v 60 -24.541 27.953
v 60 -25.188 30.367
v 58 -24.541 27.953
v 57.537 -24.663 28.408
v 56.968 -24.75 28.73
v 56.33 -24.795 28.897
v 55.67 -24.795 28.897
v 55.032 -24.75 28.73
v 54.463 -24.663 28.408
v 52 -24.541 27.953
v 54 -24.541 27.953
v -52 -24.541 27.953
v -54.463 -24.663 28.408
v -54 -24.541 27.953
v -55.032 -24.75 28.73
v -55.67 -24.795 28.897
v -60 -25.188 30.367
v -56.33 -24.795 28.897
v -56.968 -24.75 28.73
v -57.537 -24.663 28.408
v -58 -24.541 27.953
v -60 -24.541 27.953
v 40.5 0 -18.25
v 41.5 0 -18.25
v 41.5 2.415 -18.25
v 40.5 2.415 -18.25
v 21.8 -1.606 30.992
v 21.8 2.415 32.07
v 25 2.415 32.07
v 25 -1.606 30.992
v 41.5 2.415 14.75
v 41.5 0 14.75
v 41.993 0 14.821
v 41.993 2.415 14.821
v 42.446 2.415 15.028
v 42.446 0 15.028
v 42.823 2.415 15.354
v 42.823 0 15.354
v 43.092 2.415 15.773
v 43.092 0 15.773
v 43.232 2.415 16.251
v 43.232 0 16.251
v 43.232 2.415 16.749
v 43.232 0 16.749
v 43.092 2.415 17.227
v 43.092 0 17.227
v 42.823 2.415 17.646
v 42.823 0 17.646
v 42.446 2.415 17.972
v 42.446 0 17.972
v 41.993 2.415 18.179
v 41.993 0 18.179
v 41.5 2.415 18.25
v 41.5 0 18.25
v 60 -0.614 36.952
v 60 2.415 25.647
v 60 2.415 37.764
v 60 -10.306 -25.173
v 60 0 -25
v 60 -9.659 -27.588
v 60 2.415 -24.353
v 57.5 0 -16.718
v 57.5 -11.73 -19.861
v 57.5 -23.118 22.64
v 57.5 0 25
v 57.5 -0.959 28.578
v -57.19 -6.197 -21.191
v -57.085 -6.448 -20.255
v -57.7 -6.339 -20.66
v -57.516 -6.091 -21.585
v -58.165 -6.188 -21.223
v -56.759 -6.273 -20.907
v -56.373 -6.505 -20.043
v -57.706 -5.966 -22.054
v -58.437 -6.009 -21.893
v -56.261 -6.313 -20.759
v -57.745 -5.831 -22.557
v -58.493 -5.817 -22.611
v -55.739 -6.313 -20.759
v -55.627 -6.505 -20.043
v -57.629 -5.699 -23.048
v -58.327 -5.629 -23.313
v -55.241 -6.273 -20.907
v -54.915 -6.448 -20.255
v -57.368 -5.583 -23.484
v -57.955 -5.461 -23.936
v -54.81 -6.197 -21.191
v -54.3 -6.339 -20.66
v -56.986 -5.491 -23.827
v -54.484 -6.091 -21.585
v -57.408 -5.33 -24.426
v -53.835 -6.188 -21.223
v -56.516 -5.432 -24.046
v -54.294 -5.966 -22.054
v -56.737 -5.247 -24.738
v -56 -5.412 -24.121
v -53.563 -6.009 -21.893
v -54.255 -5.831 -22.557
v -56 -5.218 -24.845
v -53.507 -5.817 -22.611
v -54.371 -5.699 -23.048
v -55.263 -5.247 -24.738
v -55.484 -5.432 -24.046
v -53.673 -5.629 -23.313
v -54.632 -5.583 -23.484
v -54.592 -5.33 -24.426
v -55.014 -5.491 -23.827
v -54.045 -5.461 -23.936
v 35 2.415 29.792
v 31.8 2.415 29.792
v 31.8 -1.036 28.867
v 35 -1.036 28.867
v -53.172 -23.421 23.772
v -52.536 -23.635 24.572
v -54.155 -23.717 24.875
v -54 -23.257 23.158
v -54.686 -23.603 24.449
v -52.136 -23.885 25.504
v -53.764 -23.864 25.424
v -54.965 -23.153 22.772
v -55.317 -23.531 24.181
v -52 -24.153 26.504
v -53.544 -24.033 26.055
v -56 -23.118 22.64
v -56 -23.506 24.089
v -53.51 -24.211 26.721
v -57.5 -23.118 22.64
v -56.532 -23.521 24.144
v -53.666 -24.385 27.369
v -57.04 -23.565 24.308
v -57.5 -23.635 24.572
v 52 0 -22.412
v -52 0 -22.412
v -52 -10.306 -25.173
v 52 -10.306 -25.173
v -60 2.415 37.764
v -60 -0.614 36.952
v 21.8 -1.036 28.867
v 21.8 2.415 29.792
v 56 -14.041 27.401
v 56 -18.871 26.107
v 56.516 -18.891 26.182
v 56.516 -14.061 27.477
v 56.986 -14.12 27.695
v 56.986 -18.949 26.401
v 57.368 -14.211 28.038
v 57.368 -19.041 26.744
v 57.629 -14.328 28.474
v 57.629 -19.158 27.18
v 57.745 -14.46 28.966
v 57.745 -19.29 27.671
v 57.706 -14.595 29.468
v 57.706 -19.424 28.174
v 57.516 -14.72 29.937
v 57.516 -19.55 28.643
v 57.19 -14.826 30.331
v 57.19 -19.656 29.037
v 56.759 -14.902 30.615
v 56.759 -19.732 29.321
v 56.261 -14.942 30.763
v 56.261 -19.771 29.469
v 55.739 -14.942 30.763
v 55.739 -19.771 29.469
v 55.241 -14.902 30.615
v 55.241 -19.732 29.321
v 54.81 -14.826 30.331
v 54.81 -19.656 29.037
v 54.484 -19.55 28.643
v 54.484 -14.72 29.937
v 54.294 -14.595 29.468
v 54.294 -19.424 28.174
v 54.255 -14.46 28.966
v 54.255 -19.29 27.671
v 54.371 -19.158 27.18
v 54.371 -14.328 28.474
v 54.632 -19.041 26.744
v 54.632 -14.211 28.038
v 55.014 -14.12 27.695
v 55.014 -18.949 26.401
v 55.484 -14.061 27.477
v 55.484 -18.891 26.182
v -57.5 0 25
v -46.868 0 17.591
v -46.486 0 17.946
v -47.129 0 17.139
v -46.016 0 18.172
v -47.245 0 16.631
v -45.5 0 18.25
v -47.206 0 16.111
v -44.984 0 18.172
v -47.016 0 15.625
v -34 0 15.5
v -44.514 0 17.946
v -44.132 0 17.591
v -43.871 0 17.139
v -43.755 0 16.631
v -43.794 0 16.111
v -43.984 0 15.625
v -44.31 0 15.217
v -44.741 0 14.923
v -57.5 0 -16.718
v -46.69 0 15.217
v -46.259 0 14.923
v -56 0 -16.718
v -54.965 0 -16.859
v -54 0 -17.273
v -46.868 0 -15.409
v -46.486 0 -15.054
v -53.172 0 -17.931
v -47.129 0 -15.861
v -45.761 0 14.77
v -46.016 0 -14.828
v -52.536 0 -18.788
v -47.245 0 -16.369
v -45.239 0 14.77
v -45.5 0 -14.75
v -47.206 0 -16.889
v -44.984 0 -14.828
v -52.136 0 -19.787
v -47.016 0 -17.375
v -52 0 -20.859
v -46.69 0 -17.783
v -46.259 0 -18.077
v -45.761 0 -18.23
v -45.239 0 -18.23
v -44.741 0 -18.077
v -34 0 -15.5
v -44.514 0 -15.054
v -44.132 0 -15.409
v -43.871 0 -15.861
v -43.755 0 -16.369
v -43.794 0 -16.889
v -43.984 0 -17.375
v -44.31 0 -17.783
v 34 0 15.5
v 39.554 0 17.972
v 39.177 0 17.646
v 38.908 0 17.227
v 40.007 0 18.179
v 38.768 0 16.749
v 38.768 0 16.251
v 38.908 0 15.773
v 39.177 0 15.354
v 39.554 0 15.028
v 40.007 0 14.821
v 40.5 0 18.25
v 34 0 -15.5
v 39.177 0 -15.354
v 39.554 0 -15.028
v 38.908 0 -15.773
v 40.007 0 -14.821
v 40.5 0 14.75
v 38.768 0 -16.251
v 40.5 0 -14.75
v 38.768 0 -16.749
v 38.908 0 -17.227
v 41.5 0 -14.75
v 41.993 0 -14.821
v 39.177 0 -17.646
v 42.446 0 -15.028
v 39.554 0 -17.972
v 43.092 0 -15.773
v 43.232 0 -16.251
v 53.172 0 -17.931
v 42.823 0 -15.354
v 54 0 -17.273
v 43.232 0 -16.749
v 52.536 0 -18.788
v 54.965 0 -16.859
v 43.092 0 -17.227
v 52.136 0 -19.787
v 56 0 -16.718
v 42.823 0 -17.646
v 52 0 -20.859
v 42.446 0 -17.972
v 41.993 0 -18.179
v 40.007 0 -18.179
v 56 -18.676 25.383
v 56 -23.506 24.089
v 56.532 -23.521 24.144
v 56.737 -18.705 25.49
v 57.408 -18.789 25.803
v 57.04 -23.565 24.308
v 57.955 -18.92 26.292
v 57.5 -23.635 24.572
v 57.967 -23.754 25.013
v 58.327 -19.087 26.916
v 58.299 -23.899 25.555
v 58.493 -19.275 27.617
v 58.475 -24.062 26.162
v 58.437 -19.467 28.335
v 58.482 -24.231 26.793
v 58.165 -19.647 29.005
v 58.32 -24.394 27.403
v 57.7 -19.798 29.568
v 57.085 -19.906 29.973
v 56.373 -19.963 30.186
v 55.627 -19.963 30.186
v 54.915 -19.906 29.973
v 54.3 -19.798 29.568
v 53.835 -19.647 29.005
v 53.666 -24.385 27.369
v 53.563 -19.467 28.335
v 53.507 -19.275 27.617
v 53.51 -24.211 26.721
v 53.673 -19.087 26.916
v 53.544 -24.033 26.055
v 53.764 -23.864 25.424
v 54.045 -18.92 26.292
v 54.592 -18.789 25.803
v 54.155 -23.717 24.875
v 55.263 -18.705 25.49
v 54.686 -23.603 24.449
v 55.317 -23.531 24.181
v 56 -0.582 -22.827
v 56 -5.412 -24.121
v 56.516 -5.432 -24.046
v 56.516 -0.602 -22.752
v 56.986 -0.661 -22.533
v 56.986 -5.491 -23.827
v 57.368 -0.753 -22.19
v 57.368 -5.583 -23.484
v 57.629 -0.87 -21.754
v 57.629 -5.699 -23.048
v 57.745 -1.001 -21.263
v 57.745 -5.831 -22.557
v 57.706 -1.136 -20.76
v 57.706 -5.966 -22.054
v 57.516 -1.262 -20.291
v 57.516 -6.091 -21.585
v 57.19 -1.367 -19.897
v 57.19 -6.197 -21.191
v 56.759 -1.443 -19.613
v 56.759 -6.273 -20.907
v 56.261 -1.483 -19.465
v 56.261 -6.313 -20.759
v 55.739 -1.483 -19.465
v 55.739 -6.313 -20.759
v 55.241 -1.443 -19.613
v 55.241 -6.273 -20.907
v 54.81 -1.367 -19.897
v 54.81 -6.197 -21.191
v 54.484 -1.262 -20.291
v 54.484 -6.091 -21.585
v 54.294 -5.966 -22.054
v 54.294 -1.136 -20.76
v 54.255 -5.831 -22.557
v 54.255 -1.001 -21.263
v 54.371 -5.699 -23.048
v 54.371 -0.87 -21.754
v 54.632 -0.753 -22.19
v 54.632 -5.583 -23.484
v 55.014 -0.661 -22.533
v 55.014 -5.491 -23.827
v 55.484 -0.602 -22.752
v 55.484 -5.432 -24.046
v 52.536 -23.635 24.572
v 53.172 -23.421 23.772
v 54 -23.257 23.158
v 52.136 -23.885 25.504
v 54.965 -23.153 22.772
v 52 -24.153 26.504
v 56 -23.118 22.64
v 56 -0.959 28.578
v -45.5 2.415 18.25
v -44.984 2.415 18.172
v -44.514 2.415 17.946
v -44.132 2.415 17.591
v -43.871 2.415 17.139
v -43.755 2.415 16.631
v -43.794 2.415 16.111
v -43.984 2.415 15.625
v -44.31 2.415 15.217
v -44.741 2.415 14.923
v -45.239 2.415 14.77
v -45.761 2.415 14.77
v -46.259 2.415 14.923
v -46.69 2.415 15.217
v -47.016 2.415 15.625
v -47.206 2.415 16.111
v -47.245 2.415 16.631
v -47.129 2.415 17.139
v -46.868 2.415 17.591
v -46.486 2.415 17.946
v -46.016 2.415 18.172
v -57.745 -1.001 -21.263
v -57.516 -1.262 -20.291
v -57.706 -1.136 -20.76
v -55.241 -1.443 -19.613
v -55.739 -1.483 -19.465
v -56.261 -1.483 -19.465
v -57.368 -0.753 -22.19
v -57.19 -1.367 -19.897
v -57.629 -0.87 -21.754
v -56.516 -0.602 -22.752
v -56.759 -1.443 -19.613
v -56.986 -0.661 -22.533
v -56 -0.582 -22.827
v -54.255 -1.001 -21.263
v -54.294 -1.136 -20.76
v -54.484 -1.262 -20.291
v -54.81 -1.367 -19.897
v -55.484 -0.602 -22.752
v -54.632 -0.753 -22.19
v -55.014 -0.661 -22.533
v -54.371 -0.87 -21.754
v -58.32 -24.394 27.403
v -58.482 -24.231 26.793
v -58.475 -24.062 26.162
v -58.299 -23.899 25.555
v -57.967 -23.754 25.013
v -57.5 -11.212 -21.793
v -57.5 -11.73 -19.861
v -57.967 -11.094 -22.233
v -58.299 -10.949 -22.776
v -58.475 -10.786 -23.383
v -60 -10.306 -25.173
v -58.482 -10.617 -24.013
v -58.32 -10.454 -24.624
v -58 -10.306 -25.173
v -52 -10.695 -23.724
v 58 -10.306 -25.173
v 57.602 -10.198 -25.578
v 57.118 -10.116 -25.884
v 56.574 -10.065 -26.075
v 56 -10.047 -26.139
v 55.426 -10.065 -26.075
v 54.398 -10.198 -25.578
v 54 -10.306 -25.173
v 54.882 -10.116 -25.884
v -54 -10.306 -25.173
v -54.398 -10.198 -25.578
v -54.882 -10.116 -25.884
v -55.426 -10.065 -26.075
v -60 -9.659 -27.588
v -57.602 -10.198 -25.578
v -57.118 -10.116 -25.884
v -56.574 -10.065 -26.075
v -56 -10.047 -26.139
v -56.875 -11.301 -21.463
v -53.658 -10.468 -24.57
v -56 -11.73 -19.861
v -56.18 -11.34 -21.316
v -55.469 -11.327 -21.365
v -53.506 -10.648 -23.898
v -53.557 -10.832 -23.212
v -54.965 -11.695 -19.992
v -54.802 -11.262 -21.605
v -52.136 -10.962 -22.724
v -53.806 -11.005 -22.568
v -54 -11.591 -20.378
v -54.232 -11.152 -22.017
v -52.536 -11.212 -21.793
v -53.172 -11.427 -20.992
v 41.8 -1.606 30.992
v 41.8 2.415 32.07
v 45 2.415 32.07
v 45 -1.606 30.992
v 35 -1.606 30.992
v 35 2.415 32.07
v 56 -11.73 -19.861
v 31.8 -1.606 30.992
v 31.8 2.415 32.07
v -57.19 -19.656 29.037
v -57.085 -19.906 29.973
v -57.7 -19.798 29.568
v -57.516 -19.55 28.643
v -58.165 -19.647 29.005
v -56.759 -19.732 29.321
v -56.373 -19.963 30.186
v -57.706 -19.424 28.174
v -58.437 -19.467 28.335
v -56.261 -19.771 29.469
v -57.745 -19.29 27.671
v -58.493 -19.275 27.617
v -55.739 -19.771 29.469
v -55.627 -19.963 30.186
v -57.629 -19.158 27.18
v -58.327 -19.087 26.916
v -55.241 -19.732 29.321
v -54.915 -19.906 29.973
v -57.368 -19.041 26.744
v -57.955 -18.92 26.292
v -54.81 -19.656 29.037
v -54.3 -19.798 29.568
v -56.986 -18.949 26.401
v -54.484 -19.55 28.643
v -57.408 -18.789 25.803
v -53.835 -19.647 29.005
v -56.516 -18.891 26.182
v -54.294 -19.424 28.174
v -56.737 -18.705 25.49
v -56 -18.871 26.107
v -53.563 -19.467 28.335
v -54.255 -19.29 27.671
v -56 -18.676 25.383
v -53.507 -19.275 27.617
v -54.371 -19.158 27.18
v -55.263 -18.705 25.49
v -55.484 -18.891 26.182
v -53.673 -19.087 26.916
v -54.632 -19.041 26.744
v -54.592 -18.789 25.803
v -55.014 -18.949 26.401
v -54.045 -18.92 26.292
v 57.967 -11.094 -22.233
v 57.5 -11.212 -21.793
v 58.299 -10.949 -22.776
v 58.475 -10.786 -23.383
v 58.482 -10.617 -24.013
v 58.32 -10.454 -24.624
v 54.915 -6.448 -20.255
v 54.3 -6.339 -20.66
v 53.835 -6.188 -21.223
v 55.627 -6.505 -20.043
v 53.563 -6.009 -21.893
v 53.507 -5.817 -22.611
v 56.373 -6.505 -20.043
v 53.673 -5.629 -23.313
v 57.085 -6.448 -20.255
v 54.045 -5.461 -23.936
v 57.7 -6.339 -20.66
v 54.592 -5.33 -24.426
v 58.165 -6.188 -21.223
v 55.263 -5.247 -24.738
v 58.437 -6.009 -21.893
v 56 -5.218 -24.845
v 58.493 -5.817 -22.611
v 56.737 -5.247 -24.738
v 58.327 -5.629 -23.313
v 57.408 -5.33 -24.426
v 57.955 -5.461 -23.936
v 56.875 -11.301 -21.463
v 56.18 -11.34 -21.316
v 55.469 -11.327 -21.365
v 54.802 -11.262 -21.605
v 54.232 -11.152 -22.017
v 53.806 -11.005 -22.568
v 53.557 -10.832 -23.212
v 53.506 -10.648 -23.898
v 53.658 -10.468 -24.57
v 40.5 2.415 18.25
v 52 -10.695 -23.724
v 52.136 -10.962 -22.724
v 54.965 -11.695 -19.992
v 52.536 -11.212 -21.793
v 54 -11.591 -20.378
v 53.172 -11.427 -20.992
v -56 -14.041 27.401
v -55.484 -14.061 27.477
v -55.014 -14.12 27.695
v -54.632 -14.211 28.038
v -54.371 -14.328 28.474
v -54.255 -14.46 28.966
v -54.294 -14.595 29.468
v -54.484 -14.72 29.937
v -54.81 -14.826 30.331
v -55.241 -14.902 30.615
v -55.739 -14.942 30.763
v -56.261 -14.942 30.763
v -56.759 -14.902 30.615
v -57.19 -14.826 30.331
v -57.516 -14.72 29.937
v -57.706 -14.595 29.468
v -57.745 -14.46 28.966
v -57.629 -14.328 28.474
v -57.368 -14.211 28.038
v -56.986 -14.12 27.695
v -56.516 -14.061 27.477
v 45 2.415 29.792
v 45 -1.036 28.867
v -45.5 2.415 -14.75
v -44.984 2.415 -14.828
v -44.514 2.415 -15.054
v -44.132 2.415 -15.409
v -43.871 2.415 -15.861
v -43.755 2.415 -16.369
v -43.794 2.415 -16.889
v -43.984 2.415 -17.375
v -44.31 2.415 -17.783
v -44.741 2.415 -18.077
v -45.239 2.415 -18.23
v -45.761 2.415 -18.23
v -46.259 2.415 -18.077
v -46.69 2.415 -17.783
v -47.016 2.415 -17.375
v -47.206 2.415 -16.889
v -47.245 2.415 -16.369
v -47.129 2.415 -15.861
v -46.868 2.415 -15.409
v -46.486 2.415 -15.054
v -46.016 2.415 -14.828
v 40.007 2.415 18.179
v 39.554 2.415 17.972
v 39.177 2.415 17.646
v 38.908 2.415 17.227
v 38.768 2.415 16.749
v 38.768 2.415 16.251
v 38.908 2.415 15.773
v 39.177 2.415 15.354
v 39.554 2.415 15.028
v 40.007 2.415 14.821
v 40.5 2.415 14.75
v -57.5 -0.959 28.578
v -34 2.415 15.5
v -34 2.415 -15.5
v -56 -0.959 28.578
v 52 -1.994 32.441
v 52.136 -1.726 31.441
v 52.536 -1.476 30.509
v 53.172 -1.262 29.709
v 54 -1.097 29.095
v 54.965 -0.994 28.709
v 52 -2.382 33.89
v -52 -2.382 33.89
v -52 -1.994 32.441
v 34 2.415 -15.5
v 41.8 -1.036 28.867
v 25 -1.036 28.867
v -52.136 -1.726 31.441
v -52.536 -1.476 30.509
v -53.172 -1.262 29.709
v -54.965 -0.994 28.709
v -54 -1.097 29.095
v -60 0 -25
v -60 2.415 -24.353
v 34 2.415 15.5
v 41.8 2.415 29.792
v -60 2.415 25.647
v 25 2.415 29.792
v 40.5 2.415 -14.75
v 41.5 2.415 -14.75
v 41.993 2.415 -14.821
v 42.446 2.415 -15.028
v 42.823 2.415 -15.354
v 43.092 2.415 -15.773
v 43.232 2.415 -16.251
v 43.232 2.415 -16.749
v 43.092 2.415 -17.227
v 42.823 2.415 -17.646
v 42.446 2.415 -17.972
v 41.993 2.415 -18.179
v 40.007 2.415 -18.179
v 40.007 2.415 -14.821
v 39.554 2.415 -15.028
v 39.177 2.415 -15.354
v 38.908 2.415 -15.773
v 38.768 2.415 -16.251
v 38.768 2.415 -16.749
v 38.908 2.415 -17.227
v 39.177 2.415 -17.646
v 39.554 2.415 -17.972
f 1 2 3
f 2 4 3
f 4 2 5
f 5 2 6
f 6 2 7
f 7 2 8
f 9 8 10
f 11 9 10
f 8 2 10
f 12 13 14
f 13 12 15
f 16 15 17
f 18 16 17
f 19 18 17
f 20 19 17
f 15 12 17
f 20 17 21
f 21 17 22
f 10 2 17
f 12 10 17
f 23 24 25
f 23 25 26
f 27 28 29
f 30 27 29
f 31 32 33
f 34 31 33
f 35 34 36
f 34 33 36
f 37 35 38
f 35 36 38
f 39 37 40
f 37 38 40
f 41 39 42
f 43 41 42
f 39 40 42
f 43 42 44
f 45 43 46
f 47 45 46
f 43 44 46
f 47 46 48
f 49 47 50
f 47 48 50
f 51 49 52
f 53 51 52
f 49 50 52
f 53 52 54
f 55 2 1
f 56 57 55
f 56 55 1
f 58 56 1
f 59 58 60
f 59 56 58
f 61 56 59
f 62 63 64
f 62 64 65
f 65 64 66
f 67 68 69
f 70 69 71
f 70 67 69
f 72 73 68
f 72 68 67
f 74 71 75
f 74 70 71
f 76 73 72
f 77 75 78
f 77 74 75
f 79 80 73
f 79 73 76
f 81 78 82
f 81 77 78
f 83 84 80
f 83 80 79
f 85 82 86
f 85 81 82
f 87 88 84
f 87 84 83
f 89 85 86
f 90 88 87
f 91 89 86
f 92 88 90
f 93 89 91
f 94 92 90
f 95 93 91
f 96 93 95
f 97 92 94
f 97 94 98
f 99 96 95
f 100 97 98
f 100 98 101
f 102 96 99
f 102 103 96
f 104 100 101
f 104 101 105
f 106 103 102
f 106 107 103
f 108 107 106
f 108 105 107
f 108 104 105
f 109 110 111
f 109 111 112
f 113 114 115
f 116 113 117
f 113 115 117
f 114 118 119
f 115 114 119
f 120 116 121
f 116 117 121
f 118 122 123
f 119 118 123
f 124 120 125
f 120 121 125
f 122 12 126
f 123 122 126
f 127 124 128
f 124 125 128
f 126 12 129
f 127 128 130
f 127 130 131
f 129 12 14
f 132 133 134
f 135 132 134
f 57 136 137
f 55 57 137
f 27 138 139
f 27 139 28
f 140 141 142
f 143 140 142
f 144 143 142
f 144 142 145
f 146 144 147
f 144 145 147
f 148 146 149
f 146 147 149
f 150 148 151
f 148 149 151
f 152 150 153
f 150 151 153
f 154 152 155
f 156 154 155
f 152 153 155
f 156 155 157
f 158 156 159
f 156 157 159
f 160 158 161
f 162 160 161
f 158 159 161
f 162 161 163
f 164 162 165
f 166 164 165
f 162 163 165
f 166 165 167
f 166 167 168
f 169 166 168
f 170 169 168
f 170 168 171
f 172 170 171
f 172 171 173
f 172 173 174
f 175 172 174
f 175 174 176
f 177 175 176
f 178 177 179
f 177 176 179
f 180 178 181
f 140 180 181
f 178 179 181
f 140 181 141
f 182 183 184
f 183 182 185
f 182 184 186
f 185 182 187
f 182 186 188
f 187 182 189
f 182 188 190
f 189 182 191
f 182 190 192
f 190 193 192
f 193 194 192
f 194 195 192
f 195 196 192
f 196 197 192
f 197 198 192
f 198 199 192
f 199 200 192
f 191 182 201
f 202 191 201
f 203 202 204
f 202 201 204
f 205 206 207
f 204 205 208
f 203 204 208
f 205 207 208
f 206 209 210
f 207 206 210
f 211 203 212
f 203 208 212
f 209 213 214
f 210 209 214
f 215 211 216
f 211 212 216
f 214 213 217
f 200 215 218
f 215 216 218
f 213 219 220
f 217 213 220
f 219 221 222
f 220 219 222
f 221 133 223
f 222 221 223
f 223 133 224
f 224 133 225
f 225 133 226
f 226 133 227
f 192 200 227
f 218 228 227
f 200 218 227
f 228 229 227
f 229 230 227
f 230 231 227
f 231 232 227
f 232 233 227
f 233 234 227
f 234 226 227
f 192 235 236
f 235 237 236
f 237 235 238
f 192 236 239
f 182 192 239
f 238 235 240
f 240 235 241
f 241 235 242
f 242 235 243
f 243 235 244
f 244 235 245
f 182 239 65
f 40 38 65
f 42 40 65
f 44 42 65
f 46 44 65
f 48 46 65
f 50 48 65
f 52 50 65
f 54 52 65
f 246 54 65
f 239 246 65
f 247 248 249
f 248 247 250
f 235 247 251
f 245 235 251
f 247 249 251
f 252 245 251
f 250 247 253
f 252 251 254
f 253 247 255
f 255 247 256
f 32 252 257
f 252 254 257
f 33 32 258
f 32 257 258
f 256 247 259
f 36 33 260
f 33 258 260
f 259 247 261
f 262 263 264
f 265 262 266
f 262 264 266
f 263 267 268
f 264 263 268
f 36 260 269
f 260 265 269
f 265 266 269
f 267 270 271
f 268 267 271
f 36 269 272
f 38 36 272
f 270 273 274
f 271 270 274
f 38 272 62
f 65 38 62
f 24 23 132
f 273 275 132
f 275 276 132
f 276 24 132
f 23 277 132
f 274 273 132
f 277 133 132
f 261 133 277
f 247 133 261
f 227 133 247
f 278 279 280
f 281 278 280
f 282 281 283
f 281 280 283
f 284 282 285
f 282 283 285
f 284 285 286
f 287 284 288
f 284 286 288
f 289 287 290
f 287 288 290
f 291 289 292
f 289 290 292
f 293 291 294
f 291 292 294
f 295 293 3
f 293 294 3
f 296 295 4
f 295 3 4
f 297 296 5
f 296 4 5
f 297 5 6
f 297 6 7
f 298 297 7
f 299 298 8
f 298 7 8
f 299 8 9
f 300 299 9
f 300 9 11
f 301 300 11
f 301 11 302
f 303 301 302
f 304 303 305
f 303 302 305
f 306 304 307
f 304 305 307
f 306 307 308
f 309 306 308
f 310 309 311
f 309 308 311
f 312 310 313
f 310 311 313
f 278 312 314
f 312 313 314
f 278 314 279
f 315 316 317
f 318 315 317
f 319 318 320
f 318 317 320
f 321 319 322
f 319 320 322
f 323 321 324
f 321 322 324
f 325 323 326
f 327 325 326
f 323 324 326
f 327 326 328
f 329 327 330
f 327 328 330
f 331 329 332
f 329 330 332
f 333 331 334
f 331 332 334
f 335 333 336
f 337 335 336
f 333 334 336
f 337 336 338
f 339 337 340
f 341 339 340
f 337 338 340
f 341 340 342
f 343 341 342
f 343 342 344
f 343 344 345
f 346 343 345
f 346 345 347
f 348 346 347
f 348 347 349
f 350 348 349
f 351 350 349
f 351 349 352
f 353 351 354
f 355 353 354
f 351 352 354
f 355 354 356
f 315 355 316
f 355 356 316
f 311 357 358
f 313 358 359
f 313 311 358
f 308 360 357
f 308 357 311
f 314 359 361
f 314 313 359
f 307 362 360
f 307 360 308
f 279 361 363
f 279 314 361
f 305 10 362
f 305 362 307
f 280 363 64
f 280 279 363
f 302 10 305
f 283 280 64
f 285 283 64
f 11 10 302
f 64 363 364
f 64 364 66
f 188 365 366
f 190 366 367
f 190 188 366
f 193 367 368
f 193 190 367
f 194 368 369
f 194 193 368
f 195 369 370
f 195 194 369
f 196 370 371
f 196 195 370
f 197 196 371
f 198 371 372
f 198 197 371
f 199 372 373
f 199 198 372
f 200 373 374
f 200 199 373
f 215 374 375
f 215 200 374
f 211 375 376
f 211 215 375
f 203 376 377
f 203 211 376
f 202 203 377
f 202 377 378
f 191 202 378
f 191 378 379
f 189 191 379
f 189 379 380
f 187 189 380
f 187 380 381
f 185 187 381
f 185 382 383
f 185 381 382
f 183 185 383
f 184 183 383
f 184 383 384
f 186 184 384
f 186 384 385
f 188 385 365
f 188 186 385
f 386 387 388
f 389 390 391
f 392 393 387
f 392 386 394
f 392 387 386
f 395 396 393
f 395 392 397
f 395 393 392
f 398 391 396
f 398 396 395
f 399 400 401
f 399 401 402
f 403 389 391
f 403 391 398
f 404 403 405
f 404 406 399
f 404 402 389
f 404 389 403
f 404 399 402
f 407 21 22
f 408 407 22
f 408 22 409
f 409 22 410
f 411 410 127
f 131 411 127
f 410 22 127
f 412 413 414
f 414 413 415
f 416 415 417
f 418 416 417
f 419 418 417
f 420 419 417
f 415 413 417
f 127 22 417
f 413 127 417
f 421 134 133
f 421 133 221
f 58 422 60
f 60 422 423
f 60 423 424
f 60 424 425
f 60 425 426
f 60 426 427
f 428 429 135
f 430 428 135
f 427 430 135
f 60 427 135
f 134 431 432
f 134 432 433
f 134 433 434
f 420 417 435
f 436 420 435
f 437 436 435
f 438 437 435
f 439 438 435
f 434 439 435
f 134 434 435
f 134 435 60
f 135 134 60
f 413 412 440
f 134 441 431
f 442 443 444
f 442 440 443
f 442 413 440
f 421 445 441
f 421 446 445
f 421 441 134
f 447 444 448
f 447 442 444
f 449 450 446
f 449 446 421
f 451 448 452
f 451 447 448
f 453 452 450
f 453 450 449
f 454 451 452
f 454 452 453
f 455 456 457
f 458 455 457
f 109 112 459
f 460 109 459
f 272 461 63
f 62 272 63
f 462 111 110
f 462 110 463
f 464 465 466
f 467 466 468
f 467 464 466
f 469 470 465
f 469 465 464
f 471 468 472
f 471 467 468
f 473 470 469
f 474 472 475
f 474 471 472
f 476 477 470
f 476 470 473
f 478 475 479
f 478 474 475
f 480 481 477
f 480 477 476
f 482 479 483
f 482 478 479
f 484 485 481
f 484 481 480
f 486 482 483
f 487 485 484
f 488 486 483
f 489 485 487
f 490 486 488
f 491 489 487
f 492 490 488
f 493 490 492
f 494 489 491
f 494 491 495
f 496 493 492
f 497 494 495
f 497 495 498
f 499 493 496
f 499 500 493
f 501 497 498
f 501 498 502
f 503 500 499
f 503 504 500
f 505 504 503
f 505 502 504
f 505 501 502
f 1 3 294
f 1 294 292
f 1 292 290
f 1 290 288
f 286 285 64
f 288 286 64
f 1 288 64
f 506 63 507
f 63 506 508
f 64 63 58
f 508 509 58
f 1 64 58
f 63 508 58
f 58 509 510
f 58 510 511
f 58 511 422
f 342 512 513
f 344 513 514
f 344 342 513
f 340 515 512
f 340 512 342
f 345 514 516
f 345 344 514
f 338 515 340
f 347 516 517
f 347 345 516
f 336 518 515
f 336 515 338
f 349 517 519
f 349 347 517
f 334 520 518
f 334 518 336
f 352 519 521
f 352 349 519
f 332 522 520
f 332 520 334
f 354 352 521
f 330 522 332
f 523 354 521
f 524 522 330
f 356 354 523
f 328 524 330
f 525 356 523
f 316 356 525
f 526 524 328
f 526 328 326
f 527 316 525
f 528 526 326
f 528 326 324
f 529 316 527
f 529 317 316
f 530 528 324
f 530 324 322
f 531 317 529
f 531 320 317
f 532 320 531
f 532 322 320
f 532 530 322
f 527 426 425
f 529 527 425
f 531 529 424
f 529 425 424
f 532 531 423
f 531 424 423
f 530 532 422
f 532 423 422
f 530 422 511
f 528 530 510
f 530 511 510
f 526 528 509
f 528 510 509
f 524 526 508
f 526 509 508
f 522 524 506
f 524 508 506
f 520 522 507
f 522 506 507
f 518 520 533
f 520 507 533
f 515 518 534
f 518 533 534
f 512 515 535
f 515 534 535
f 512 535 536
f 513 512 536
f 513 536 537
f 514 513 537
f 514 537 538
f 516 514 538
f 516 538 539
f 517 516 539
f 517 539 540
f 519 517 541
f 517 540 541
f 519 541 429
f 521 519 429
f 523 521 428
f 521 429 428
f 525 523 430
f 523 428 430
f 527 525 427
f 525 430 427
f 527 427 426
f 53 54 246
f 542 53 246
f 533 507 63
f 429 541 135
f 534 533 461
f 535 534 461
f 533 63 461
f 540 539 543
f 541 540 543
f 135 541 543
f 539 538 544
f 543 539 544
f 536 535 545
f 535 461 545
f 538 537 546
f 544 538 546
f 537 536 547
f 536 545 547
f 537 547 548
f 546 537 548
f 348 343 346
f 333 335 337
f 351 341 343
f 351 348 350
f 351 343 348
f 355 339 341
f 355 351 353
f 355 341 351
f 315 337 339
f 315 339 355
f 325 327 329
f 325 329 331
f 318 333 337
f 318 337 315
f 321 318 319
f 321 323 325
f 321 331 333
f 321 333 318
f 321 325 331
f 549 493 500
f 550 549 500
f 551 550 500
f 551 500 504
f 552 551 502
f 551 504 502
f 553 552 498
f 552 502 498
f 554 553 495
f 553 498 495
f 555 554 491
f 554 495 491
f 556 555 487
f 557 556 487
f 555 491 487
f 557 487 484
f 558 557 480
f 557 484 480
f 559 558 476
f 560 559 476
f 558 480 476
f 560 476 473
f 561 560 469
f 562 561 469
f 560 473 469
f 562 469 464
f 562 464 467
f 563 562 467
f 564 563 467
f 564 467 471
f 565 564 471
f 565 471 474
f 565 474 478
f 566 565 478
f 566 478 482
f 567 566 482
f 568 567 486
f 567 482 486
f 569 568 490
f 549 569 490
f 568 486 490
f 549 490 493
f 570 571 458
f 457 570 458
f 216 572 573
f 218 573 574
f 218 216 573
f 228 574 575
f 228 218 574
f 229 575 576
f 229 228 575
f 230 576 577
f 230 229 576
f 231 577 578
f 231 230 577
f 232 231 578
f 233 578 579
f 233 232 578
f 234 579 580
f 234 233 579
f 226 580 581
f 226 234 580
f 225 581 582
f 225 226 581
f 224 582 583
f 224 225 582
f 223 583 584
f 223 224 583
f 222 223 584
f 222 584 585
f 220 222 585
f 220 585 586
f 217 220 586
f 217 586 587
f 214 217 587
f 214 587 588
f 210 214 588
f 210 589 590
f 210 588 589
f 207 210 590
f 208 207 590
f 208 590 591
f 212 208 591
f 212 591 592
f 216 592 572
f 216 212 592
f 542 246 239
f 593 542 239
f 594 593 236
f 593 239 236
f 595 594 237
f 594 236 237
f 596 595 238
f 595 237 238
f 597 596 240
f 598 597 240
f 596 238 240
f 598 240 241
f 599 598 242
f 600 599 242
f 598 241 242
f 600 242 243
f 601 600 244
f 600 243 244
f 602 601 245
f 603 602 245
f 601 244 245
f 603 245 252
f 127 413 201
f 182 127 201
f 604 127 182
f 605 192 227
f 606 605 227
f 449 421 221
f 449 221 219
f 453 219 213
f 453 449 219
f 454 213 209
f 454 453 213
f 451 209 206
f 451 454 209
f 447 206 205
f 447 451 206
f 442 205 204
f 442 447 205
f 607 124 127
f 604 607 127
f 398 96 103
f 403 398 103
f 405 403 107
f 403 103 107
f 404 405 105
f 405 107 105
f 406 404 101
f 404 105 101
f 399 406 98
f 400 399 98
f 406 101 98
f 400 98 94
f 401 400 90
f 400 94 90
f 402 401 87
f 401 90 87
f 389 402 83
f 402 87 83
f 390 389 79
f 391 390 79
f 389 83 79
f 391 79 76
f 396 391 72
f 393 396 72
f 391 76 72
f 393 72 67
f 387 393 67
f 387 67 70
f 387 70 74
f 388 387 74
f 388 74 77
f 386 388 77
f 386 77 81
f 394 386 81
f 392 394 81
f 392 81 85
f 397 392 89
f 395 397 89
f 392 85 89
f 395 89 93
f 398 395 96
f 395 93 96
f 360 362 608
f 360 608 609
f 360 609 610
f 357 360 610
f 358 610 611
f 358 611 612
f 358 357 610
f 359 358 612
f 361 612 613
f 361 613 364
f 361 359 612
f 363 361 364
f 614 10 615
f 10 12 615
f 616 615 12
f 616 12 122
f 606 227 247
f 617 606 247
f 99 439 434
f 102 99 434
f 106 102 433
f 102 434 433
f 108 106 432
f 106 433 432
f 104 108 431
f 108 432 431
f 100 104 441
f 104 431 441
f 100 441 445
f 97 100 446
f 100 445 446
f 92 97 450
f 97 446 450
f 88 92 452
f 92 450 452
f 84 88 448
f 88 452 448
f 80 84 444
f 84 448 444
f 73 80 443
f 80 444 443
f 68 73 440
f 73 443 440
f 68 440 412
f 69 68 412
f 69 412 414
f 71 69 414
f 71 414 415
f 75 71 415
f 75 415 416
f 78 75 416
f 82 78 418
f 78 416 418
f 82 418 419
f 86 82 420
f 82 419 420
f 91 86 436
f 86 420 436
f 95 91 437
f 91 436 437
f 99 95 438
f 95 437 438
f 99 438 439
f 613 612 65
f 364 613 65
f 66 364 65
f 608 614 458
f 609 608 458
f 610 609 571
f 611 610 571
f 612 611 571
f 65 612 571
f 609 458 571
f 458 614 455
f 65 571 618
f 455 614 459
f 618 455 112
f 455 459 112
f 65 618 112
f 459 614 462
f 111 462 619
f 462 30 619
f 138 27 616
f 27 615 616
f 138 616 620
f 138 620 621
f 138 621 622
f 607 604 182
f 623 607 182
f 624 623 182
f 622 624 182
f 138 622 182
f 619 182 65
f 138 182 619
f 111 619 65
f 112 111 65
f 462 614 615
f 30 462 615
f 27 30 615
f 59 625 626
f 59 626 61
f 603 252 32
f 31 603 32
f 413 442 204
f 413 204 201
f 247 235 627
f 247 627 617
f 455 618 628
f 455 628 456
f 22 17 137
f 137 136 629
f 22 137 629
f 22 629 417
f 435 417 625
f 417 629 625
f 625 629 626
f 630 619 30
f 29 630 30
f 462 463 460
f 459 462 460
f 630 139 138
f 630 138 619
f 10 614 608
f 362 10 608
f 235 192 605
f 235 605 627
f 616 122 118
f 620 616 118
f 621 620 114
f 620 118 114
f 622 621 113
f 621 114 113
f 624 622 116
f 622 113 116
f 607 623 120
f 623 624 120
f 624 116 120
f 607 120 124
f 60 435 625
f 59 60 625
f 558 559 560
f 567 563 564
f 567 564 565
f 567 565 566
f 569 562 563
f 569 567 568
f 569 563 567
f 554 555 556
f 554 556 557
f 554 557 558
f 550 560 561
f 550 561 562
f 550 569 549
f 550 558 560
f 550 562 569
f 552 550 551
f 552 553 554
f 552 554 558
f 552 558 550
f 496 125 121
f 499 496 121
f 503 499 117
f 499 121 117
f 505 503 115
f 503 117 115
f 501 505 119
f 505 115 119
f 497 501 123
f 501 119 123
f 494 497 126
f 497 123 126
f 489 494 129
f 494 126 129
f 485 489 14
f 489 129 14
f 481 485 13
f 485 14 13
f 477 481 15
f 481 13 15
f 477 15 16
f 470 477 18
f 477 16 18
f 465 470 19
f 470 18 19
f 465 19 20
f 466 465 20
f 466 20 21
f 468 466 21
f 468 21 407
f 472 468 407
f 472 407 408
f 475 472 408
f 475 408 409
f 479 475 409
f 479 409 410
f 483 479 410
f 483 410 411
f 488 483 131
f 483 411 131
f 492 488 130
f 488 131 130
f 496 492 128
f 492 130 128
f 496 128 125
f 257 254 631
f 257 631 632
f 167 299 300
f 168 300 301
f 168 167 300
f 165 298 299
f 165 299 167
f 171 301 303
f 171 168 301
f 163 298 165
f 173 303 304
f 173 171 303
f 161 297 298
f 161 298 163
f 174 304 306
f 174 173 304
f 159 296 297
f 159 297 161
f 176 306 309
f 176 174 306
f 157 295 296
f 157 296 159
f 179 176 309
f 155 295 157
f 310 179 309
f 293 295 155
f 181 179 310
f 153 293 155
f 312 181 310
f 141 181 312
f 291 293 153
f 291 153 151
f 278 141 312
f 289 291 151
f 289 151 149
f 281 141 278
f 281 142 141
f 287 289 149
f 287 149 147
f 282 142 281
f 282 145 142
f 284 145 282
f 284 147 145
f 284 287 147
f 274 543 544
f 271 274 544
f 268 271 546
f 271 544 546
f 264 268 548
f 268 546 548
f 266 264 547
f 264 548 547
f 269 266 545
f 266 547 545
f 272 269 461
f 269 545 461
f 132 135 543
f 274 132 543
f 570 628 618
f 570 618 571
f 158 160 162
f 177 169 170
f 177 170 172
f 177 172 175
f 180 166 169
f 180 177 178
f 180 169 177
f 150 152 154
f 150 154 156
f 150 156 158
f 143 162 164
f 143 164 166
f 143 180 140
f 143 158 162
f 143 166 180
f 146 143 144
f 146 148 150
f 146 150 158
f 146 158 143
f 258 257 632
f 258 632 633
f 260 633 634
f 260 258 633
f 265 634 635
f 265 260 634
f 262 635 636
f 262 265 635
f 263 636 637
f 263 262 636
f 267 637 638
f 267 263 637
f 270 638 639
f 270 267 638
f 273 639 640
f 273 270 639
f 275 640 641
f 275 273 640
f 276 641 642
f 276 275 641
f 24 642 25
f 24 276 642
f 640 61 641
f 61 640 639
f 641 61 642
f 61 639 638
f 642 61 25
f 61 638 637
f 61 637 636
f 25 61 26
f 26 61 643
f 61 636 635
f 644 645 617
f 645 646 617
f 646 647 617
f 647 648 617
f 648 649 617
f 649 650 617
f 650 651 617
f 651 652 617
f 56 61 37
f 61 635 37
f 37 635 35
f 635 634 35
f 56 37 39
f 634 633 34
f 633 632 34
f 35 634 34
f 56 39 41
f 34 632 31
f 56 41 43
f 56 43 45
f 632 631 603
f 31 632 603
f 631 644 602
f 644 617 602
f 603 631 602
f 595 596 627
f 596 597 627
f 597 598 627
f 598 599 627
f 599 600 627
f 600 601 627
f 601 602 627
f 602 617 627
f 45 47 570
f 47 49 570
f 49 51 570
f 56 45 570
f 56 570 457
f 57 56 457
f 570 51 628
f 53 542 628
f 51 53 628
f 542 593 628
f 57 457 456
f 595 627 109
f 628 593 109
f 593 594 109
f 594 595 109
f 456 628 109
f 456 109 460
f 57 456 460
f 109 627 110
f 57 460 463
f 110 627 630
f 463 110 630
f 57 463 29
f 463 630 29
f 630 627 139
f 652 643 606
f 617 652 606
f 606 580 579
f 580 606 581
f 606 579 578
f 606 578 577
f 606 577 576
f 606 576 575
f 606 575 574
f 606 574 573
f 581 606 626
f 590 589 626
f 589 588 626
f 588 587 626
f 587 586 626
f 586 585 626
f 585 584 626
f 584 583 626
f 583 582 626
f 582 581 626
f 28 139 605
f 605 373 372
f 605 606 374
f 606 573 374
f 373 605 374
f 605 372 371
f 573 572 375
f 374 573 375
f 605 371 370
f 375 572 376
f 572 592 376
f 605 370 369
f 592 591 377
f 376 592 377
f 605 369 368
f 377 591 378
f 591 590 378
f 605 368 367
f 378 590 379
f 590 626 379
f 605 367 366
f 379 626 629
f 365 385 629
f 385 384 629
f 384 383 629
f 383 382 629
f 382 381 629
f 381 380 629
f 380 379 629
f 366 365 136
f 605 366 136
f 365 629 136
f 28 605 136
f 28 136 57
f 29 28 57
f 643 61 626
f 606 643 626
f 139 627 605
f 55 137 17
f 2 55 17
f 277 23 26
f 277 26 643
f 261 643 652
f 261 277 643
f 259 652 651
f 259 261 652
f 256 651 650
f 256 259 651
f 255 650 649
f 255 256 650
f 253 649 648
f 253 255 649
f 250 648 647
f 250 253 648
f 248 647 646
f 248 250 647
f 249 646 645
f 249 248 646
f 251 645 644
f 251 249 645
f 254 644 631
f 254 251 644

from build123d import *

# Parameters (mm, degrees)
SKETCH_1_W               = 120
SKETCH_1_H               = 50
EXTRUDE_2_DEPTH          = 2.5
SKETCH_1_3_R             = 1.75
SKETCH_1_3_W             = 68
SKETCH_1_3_H             = 31
CUT_EXTRUDE_1_DEPTH      = 66.296266207
EXTRUDE_START            = -60
EXTRUDE_3_DEPTH          = 120
EXTRUDE_3_2_DEPTH        = 2.5
EXTRUDE_START_2          = 57.5
EXTRUDE_3_3_DEPTH        = 2.5
CUT_EXTRUDE_2_DEPTH      = 129.109700543
CUT_EXTRUDE_2_DEPTH_BACK = 129.109700543
EXTRUDE_4_DEPTH          = 120
EXTRUDE_5_REACH          = 77.063
EXTRUDE_6_REACH          = 77.063
SKETCH_7_R               = 2.5
CUT_EXTRUDE_3_DEPTH      = 5
SKETCH_8_R               = 1.75
CUT_EXTRUDE_4_DEPTH      = 5
EXTRUDE_8_DEPTH          = 120
SKETCH_10_W              = 3.2
SKETCH_10_H              = 2.2
CUT_EXTRUDE_5_DEPTH      = 10


# Read off the part's stored shape, not the designer's step: 凸台-拉伸3
with BuildPart() as part:
    # 草图1 → 凸台-拉伸2 (new, along a direction that is not the sketch's normal)
    with BuildSketch(Plane(origin=(0, 0, 0), x_dir=(1, 0, 0), z_dir=(0, 1, 0))):
        Rectangle(SKETCH_1_W, SKETCH_1_H)
    extrude(amount=EXTRUDE_2_DEPTH, dir=(0, 0.9659258262890672, 0.2588190451025249))

    # 草图1<3> → 切除-拉伸1 (cut, through all)
    with BuildSketch(Plane(origin=(0, 0, 0), x_dir=(1, 0, 0), z_dir=(0, 1, 0))):
        with Locations(Location((-45.5, 16.5, 0), (0, 0, 270))):
            Circle(SKETCH_1_3_R)
        with Locations(Location((-45.5, -16.5, 0), (0, 0, 270))):
            Circle(SKETCH_1_3_R)
        Rectangle(SKETCH_1_3_W, SKETCH_1_3_H)
        with BuildLine():
            Line((41.5, 18.25), (40.5, 18.25))
            ThreePointArc((40.5, 18.25), (38.75, 16.5), (40.5, 14.75))
            Line((40.5, 14.75), (41.5, 14.75))
            ThreePointArc((41.5, 14.75), (43.25, 16.5), (41.5, 18.25))
        make_face()
        with BuildLine():
            Line((41.5, -18.25), (40.5, -18.25))
            ThreePointArc((40.5, -18.25), (38.75, -16.5), (40.5, -14.75))
            Line((40.5, -14.75), (41.5, -14.75))
            ThreePointArc((41.5, -14.75), (43.25, -16.5), (41.5, -18.25))
        make_face()
    extrude(amount=CUT_EXTRUDE_1_DEPTH, mode=Mode.SUBTRACT)

    # 凸台-拉伸3 outline → 凸台-拉伸3 (add)
    with BuildSketch(Plane.YZ.offset(EXTRUDE_START)):
        Polygon((-10.306305876, -25.173375885), (-9.659258263, -27.588190451), (0, -25), (0, -22.411809549), align=None)
        Polygon((-25.188400969, 30.367359126), (-24.541353356, 27.952544561), (0, 34.528380374), (0, 37.116570825), align=None)
    extrude(amount=EXTRUDE_3_DEPTH)

    # Extrude 3 2 outline → Extrude 3 2 (add)
    with BuildSketch(Plane.YZ.offset(EXTRUDE_START)):
        Polygon((-24.541353356, 27.952544561), (-10.306305876, -25.173375885), (0, -22.411809549), (0, 34.528380374), align=None)
    extrude(amount=EXTRUDE_3_2_DEPTH)

    # Extrude 3 3 outline → Extrude 3 3 (add)
    with BuildSketch(Plane.YZ.offset(EXTRUDE_START_2)):
        Polygon((-24.541353356, 27.952544561), (-10.306305876, -25.173375885), (0, -22.411809549), (0, 34.528380374), align=None)
    extrude(amount=EXTRUDE_3_3_DEPTH)

    # 草图4 → 切除-拉伸2 (cut, two sides: drawn at the far end of the back side and taken through both)
    with BuildSketch(Plane.ZY.offset(60).offset(-CUT_EXTRUDE_2_DEPTH_BACK)):
        Polygon((25.647047613, 2.414814566), (36.951962095, -0.61432814), (37.116570825, 0), align=None)
    extrude(amount=CUT_EXTRUDE_2_DEPTH + CUT_EXTRUDE_2_DEPTH_BACK, mode=Mode.SUBTRACT)

    # 草图5 → 凸台-拉伸4 (add)
    with BuildSketch(Plane.ZY.offset(60)):
        Polygon((25.647047613, 2.414814566), (36.951962095, -0.61432814), (36.304914483, -3.029142706), (25, 0), align=None)
    extrude(amount=-EXTRUDE_4_DEPTH)

    # 凸台-拉伸5: up to this plane
    extrude_5_end = Plane(origin=(0, 0, 0), z_dir=(0, 1, 0))
    # 草图6 → 凸台-拉伸5 (add, up to the surface)
    with BuildSketch(Plane(origin=(0, -15.909258263, -4.262872904), x_dir=(1, 0, 0), z_dir=(0, -0.9659258262890672, -0.25881904510252496)), mode=Mode.PRIVATE) as extrude_5_sk1:
        with BuildLine():
            Line((-60, -24.148145657), (-52, -24.148145657))
            Line((-52, -24.148145657), (-52, -20.148145657))
            ThreePointArc((-52, -20.148145657), (-53.171572875, -17.319718532), (-56, -16.148145657))
            Line((-56, -16.148145657), (-60, -16.148145657))
            Line((-60, -16.148145657), (-60, -24.148145657))
        make_face()
    extrude_5_tool1 = split(extrude(extrude_5_sk1.sketch, amount=-EXTRUDE_5_REACH, mode=Mode.PRIVATE), bisect_by=extrude_5_end, keep=Keep.BOTH, mode=Mode.PRIVATE)
    add(extrude_5_tool1.solids().sort_by_distance((-56.176115, -10.648952, -23.894601))[0])
    # 草图6 → 凸台-拉伸5 (add, up to the surface)
    with BuildSketch(Plane(origin=(0, -15.909258263, -4.262872904), x_dir=(1, 0, 0), z_dir=(0, -0.9659258262890672, -0.25881904510252496)), mode=Mode.PRIVATE) as extrude_5_sk2:
        with BuildLine():
            Line((60, -24.148145657), (52, -24.148145657))
            Line((52, -24.148145657), (52, -20.148145657))
            ThreePointArc((52, -20.148145657), (53.171572875, -17.319718532), (56, -16.148145657))
            Line((56, -16.148145657), (60, -16.148145657))
            Line((60, -16.148145657), (60, -24.148145657))
        make_face()
    extrude_5_tool2 = split(extrude(extrude_5_sk2.sketch, amount=-EXTRUDE_5_REACH, mode=Mode.PRIVATE), bisect_by=extrude_5_end, keep=Keep.BOTH, mode=Mode.PRIVATE)
    add(extrude_5_tool2.solids().sort_by_distance((56.176115, -10.648952, -23.894601))[0])

    # 草图6<4> → 凸台-拉伸6 (add, up to next)
    with BuildSketch(Plane(origin=(0, -15.909258263, -4.262872904), x_dir=(1, 0, 0), z_dir=(0, -0.9659258262890672, -0.25881904510252496)), mode=Mode.PRIVATE) as extrude_6_sk1:
        with BuildLine():
            Line((-60, 35.851854343), (-52, 35.851854343))
            Line((-52, 35.851854343), (-52, 31.851854343))
            ThreePointArc((-52, 31.851854343), (-53.171572875, 29.023427218), (-56, 27.851854343))
            Line((-56, 27.851854343), (-60, 27.851854343))
            Line((-60, 27.851854343), (-60, 35.851854343))
        make_face()
    extrude_6_tool1 = extrude(extrude_6_sk1.sketch, amount=-EXTRUDE_6_REACH, mode=Mode.PRIVATE) - part.part
    # 草图6<4> → 凸台-拉伸6 (add, up to next)
    with BuildSketch(Plane(origin=(0, -15.909258263, -4.262872904), x_dir=(1, 0, 0), z_dir=(0, -0.9659258262890672, -0.25881904510252496)), mode=Mode.PRIVATE) as extrude_6_sk2:
        with BuildLine():
            Line((60, 35.851854343), (52, 35.851854343))
            Line((52, 35.851854343), (52, 31.851854343))
            ThreePointArc((52, 31.851854343), (53.171572875, 29.023427218), (56, 27.851854343))
            Line((56, 27.851854343), (60, 27.851854343))
            Line((60, 27.851854343), (60, 35.851854343))
        make_face()
    extrude_6_tool2 = extrude(extrude_6_sk2.sketch, amount=-EXTRUDE_6_REACH, mode=Mode.PRIVATE) - part.part
    add(extrude_6_tool1.solids().sort_by_distance((-56.176115, -24.198707, 26.67377))[0])
    add(extrude_6_tool2.solids().sort_by_distance((56.176115, -24.198707, 26.67377))[0])

    # 草图7 → 切除-拉伸3 (cut)
    with BuildSketch(Plane(origin=(0, -15.909258263, -4.262872904), x_dir=(1, 0, 0), z_dir=(0, -0.9659258262890672, -0.25881904510252496))):
        with Locations(Location((-56, 31.851854343, 0), (0, 0, 270))):
            Circle(SKETCH_7_R)
        with Locations(Location((-56, -20.148145657, 0), (0, 0, 270))):
            Circle(SKETCH_7_R)
        with Locations(Location((56, -20.148145657, 0), (0, 0, 270))):
            Circle(SKETCH_7_R)
        with Locations(Location((56, 31.851854343, 0), (0, 0, 270))):
            Circle(SKETCH_7_R)
    extrude(amount=-CUT_EXTRUDE_3_DEPTH, mode=Mode.SUBTRACT)

    # 草图8 → 切除-拉伸4 (cut)
    with BuildSketch(Plane(origin=(0, -11.079629131, -2.968777678), x_dir=(1, 0, 0), z_dir=(0, -0.9659258262890672, -0.25881904510252496))):
        with Locations(Location((-56, 31.851854343, 0), (0, 0, 270))):
            Circle(SKETCH_8_R)
        with Locations(Location((-56, -20.148145657, 0), (0, 0, 270))):
            Circle(SKETCH_8_R)
        with Locations(Location((56, -20.148145657, 0), (0, 0, 270))):
            Circle(SKETCH_8_R)
        with Locations(Location((56, 31.851854343, 0), (0, 0, 270))):
            Circle(SKETCH_8_R)
    extrude(amount=-CUT_EXTRUDE_4_DEPTH, mode=Mode.SUBTRACT)

    # 草图11 → 凸台-拉伸8 (add)
    with BuildSketch(Plane.ZY.offset(60)):
        Polygon((25.647047613, 2.414814566), (37.763618437, 2.414814566), (36.951962095, -0.61432814), align=None)
    extrude(amount=-EXTRUDE_8_DEPTH)

    # 草图10 → 切除-拉伸5 (cut)
    with BuildSketch(Plane(origin=(0, 6.25, 1.674682453), x_dir=(1, 0, 0), z_dir=(0, -0.9659258262890672, -0.25881904510252524))):
        with Locations((33.4, 29.251854343)):
            Rectangle(SKETCH_10_W, SKETCH_10_H)
        with Locations((43.4, 29.251854343)):
            Rectangle(SKETCH_10_W, SKETCH_10_H)
        with Locations((23.4, 29.251854343)):
            Rectangle(SKETCH_10_W, SKETCH_10_H)
    extrude(amount=-CUT_EXTRUDE_5_DEPTH, mode=Mode.SUBTRACT)


solid = part.part
